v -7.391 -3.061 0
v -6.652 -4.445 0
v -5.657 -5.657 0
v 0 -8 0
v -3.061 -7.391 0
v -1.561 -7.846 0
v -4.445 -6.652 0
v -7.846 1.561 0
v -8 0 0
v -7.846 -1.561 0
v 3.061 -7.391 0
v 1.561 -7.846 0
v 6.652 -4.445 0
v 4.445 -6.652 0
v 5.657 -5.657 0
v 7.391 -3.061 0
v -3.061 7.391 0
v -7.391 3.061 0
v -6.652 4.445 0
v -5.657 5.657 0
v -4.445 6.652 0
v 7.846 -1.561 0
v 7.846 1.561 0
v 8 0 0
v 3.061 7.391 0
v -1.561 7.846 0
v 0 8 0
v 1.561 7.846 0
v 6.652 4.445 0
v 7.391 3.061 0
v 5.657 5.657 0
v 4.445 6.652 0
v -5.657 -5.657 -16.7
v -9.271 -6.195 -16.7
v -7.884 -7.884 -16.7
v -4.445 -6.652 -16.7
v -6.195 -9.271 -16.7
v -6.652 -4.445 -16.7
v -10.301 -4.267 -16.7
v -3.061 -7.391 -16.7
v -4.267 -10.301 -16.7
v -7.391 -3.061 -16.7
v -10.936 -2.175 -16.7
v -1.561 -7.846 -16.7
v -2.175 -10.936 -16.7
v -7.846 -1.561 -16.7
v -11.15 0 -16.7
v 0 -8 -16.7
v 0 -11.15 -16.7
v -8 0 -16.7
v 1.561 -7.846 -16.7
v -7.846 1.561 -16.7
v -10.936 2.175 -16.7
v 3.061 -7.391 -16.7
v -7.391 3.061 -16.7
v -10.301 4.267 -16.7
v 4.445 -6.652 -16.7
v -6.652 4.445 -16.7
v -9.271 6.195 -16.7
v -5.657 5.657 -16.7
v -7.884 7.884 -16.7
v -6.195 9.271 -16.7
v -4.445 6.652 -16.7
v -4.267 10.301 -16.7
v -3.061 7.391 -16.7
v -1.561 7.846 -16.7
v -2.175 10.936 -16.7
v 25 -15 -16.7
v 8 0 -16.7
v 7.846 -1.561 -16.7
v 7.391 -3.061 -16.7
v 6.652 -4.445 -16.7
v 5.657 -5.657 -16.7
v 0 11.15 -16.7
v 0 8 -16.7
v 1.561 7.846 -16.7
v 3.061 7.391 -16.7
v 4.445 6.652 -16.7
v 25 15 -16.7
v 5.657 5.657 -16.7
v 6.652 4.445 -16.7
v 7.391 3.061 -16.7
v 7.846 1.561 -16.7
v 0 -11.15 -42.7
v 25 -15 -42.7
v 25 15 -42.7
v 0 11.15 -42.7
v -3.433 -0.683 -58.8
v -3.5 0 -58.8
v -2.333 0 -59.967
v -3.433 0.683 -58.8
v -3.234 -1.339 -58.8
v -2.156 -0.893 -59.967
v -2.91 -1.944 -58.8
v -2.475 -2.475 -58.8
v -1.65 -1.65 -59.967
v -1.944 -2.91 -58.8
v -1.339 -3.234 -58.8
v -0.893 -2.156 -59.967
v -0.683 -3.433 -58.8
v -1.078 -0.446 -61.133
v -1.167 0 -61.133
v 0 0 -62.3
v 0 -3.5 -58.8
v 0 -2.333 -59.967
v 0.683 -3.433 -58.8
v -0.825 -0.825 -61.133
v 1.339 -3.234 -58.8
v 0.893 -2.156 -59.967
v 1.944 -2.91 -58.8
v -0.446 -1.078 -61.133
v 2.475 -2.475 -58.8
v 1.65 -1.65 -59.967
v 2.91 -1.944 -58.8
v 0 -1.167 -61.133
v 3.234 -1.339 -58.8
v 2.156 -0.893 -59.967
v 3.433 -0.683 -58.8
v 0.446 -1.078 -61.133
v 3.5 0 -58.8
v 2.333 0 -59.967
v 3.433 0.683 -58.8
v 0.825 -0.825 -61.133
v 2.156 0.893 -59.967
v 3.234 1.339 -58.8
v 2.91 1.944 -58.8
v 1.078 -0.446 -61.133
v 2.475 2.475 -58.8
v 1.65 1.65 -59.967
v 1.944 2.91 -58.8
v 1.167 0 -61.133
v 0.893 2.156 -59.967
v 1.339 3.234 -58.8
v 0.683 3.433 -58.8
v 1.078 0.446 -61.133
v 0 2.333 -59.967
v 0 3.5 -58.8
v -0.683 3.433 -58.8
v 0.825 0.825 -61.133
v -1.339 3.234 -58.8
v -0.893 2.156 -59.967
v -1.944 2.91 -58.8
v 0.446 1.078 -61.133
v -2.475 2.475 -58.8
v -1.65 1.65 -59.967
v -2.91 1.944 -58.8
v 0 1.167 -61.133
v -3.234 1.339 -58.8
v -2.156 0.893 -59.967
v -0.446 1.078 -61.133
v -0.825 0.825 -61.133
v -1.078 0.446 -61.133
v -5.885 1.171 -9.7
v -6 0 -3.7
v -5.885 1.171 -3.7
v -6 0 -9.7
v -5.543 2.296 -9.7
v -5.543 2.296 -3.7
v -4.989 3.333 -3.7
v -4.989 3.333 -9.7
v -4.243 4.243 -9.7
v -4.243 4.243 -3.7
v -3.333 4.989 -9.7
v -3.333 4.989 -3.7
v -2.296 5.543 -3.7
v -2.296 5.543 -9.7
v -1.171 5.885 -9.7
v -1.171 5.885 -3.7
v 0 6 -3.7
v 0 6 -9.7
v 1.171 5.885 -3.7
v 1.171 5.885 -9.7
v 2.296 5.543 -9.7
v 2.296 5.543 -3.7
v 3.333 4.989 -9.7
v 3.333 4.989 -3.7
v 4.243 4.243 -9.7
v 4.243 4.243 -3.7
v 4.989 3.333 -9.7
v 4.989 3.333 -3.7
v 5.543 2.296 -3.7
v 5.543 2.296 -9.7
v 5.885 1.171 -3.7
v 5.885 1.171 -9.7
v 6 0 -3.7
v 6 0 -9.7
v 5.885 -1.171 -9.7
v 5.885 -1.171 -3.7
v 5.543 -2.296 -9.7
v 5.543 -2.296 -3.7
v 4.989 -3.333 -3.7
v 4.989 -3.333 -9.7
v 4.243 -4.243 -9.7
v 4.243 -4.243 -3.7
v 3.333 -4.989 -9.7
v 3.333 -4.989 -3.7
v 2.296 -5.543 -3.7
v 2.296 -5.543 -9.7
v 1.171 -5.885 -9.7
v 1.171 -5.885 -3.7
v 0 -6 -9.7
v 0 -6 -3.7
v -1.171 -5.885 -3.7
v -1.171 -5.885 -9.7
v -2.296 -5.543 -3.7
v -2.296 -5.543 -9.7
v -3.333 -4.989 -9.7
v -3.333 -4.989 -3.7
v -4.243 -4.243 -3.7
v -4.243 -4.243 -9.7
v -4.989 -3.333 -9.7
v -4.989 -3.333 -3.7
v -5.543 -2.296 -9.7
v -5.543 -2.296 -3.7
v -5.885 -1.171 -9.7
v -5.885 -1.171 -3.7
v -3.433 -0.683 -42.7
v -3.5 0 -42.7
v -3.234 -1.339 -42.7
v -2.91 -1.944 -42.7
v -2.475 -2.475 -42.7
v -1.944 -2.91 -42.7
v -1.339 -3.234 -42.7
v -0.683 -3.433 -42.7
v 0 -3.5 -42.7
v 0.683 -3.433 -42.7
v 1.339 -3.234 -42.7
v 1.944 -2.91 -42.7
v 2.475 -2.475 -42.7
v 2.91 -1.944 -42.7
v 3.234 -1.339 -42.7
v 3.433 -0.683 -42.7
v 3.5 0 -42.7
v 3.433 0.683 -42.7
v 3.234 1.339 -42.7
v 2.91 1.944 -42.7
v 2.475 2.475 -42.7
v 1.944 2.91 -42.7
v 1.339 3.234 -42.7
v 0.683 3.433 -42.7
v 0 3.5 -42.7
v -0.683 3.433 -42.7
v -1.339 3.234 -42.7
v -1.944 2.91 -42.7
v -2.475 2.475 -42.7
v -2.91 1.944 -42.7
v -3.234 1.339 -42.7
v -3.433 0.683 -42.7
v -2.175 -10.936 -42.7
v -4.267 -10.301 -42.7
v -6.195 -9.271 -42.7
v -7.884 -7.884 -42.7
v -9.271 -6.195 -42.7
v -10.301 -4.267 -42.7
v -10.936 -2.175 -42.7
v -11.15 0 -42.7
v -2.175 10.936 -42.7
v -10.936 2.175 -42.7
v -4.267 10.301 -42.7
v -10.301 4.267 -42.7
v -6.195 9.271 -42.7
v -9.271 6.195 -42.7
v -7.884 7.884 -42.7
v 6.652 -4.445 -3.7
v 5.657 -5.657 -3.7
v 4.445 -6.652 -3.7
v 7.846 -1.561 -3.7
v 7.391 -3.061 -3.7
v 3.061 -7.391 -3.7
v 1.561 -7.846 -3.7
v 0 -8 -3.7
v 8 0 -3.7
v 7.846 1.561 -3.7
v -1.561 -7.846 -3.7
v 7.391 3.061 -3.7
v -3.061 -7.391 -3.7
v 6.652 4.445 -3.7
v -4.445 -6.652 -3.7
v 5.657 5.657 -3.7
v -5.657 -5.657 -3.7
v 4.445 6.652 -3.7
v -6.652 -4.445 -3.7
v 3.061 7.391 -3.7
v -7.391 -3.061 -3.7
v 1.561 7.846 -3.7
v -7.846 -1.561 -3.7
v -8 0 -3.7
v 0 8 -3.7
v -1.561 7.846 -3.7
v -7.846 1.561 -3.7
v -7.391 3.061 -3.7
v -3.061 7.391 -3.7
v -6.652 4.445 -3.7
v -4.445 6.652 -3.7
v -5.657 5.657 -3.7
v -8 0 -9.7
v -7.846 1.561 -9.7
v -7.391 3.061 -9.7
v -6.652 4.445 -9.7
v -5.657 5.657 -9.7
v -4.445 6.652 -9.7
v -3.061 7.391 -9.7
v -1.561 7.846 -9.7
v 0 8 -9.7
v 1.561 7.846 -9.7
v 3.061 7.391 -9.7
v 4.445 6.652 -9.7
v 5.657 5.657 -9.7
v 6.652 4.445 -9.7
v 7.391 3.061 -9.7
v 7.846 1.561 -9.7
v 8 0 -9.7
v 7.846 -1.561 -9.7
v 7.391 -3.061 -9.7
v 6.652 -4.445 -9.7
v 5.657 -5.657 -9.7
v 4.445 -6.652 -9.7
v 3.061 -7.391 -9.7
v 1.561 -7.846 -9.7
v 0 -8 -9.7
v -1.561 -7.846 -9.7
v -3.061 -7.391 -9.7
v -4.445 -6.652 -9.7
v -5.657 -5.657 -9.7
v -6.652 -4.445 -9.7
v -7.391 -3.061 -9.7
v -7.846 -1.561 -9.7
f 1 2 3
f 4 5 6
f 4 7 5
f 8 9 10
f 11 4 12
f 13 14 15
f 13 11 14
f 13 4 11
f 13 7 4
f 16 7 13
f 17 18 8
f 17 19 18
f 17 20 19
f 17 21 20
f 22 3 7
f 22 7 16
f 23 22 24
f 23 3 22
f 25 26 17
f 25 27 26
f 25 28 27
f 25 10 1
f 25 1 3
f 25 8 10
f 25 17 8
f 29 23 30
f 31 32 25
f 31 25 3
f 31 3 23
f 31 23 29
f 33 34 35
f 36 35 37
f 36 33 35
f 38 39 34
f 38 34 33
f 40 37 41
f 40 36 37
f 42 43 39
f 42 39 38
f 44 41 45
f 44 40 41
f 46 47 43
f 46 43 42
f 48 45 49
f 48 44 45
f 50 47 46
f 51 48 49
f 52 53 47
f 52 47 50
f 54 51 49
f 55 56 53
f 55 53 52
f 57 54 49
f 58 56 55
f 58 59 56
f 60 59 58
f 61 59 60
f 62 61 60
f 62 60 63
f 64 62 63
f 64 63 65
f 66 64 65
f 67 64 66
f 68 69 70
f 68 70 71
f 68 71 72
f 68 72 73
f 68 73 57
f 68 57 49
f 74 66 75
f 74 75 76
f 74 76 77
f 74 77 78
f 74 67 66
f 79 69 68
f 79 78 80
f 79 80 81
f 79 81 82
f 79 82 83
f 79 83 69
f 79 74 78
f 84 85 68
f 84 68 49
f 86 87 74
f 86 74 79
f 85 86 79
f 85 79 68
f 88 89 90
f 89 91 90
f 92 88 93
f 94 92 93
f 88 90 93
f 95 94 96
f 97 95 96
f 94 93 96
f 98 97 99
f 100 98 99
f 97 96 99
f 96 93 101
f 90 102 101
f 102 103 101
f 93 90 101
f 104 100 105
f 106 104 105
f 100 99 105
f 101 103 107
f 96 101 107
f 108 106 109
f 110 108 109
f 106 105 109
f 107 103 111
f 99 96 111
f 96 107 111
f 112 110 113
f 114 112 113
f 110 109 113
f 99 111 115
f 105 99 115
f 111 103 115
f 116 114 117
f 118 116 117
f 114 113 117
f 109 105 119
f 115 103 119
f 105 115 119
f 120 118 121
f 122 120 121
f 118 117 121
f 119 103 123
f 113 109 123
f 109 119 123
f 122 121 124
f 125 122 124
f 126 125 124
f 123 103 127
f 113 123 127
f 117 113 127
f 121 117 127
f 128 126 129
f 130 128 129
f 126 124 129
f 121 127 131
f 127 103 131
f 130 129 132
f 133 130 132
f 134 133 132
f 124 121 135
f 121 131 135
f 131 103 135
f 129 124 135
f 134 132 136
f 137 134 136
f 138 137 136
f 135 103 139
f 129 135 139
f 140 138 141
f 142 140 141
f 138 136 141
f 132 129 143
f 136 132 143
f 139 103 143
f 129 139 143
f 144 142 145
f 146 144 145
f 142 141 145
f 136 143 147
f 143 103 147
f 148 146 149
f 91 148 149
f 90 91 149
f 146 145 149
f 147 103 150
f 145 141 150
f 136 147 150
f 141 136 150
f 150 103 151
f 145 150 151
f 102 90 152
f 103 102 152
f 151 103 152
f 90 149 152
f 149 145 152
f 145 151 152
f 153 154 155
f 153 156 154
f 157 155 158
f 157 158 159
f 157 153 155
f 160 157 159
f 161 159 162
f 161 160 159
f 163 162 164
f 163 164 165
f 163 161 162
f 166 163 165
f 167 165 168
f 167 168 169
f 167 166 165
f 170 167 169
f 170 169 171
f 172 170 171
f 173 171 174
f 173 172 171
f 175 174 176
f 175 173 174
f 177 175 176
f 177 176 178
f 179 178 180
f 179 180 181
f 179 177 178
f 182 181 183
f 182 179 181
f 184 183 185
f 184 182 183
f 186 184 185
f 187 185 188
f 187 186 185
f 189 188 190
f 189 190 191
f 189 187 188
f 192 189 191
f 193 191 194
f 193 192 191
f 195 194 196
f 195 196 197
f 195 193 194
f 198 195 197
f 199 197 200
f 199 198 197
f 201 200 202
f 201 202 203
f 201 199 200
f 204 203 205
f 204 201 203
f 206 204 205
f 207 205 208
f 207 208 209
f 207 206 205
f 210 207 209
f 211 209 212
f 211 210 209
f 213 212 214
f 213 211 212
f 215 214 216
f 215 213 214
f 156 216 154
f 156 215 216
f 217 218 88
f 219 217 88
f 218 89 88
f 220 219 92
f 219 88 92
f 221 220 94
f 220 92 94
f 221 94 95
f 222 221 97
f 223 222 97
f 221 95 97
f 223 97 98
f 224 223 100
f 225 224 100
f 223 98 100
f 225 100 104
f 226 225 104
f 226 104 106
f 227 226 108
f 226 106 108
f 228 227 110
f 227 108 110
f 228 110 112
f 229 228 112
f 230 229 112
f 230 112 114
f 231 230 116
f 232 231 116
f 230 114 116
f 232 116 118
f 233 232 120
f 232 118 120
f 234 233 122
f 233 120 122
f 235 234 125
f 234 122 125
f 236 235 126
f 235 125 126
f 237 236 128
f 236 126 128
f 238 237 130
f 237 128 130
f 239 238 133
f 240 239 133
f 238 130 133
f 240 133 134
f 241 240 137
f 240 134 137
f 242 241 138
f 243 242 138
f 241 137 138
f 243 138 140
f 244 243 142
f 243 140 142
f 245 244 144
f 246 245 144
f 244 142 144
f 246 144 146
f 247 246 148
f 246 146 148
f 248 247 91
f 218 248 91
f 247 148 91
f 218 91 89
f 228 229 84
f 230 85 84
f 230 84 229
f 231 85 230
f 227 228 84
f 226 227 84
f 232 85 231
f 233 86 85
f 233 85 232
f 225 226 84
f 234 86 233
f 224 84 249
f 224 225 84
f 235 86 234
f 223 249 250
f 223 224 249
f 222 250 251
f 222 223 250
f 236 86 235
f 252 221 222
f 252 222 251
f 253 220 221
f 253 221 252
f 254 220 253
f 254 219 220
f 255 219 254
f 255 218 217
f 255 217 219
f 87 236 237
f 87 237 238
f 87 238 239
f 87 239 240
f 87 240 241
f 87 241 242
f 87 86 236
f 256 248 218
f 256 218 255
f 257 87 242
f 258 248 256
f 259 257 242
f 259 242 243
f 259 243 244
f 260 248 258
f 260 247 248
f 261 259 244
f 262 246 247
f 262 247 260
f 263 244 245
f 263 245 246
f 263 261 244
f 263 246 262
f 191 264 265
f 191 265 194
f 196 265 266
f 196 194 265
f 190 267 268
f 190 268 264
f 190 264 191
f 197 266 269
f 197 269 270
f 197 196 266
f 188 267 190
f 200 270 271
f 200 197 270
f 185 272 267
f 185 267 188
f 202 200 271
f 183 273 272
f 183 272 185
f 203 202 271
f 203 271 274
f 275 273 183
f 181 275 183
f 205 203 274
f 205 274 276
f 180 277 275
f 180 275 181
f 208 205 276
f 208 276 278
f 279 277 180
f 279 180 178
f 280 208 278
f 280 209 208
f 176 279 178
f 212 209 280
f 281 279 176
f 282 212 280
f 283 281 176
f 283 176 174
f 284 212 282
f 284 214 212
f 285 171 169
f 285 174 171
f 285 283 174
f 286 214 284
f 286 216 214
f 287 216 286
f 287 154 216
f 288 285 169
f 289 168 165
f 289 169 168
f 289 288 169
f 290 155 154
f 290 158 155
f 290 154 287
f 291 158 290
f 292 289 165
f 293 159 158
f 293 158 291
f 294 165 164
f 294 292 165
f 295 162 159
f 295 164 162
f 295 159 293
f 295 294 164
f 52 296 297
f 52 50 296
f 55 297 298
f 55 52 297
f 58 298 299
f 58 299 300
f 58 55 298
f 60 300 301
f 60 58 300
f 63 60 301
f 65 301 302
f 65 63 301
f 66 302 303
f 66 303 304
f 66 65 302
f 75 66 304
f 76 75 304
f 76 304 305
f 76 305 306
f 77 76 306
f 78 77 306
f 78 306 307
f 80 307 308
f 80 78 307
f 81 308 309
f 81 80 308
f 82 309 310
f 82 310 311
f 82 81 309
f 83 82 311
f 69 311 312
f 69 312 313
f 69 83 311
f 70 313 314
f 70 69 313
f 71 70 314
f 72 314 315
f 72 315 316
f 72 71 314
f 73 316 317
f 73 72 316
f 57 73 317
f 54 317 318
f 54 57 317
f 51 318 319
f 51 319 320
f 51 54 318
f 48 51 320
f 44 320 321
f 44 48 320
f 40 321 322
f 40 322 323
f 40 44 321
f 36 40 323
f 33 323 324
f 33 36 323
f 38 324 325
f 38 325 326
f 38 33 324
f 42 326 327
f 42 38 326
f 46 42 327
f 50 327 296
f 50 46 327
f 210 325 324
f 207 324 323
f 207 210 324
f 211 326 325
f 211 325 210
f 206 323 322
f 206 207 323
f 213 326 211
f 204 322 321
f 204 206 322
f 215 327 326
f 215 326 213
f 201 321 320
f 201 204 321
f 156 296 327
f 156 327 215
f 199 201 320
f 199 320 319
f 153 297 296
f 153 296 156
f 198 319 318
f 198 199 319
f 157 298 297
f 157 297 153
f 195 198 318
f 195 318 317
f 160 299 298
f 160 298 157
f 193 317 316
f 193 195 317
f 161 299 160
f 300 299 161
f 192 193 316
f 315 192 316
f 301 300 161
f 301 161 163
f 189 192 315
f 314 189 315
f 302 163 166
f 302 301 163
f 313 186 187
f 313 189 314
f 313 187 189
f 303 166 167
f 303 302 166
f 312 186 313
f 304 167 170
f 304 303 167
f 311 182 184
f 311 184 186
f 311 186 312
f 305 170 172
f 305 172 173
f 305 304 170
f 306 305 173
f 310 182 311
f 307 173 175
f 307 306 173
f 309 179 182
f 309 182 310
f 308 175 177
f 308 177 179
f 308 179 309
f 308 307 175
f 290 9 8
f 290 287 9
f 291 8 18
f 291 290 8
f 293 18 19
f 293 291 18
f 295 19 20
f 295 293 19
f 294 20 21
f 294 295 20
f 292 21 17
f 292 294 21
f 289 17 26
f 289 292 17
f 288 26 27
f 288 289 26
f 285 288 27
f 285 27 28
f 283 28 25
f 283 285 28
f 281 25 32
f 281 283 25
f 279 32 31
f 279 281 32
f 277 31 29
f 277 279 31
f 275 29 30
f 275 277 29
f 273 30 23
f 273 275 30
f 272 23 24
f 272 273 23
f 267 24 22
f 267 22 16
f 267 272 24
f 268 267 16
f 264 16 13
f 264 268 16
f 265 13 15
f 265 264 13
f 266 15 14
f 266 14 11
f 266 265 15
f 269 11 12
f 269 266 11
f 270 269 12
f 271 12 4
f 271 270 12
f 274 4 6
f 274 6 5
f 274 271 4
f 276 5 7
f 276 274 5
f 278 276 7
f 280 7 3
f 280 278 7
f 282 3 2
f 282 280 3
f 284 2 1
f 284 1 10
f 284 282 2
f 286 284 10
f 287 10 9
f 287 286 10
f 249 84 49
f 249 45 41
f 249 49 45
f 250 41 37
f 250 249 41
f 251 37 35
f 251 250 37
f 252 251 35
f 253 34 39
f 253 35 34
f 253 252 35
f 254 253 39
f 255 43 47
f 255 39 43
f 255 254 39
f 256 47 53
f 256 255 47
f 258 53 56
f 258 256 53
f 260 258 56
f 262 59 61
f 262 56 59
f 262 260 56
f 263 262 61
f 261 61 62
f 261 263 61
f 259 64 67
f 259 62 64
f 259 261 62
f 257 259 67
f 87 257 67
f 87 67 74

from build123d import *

# Parameters (mm, degrees)
F5_DEPTH = 26


with BuildPart() as f1:
    # F0 (on Front) → F1 (revolve)
    with BuildSketch(Plane.XZ):
        Polygon((0, 0), (-8, 0), (-8, -3.7), (-6, -3.7), (-6, -9.7), (-8, -9.7), (-8, -12.7), (-8, -16.7), (-11.15, -16.7), (-11.15, -42.7), (0, -42.7), align=None)
    revolve(axis=Axis((0, 0, -21.35), (0, 0, -1)))

    # F2 (on Front) → F3 (revolve)
    with BuildSketch(Plane.XZ):
        Polygon((0, -62.3), (0, -42.7), (-3.5, -42.7), (-3.5, -58.8), align=None)
    revolve(axis=Axis((0, 0, -52.5), (0, 0, 1)))

    # F4 (on face) → F5 (join, through all)
    with BuildSketch(Plane(origin=(0, 0, -42.7), x_dir=(1, 0, 0), z_dir=(0, 0, -1))):
        with BuildLine():
            ThreePointArc((0, 11.15), (11.15, 0), (0, -11.15))
            Line((0, -11.15), (25, -15))
            Line((25, -15), (25, 15))
            Line((25, 15), (0, 11.15))
        make_face()
    extrude(amount=-F5_DEPTH)


solid = f1.part
